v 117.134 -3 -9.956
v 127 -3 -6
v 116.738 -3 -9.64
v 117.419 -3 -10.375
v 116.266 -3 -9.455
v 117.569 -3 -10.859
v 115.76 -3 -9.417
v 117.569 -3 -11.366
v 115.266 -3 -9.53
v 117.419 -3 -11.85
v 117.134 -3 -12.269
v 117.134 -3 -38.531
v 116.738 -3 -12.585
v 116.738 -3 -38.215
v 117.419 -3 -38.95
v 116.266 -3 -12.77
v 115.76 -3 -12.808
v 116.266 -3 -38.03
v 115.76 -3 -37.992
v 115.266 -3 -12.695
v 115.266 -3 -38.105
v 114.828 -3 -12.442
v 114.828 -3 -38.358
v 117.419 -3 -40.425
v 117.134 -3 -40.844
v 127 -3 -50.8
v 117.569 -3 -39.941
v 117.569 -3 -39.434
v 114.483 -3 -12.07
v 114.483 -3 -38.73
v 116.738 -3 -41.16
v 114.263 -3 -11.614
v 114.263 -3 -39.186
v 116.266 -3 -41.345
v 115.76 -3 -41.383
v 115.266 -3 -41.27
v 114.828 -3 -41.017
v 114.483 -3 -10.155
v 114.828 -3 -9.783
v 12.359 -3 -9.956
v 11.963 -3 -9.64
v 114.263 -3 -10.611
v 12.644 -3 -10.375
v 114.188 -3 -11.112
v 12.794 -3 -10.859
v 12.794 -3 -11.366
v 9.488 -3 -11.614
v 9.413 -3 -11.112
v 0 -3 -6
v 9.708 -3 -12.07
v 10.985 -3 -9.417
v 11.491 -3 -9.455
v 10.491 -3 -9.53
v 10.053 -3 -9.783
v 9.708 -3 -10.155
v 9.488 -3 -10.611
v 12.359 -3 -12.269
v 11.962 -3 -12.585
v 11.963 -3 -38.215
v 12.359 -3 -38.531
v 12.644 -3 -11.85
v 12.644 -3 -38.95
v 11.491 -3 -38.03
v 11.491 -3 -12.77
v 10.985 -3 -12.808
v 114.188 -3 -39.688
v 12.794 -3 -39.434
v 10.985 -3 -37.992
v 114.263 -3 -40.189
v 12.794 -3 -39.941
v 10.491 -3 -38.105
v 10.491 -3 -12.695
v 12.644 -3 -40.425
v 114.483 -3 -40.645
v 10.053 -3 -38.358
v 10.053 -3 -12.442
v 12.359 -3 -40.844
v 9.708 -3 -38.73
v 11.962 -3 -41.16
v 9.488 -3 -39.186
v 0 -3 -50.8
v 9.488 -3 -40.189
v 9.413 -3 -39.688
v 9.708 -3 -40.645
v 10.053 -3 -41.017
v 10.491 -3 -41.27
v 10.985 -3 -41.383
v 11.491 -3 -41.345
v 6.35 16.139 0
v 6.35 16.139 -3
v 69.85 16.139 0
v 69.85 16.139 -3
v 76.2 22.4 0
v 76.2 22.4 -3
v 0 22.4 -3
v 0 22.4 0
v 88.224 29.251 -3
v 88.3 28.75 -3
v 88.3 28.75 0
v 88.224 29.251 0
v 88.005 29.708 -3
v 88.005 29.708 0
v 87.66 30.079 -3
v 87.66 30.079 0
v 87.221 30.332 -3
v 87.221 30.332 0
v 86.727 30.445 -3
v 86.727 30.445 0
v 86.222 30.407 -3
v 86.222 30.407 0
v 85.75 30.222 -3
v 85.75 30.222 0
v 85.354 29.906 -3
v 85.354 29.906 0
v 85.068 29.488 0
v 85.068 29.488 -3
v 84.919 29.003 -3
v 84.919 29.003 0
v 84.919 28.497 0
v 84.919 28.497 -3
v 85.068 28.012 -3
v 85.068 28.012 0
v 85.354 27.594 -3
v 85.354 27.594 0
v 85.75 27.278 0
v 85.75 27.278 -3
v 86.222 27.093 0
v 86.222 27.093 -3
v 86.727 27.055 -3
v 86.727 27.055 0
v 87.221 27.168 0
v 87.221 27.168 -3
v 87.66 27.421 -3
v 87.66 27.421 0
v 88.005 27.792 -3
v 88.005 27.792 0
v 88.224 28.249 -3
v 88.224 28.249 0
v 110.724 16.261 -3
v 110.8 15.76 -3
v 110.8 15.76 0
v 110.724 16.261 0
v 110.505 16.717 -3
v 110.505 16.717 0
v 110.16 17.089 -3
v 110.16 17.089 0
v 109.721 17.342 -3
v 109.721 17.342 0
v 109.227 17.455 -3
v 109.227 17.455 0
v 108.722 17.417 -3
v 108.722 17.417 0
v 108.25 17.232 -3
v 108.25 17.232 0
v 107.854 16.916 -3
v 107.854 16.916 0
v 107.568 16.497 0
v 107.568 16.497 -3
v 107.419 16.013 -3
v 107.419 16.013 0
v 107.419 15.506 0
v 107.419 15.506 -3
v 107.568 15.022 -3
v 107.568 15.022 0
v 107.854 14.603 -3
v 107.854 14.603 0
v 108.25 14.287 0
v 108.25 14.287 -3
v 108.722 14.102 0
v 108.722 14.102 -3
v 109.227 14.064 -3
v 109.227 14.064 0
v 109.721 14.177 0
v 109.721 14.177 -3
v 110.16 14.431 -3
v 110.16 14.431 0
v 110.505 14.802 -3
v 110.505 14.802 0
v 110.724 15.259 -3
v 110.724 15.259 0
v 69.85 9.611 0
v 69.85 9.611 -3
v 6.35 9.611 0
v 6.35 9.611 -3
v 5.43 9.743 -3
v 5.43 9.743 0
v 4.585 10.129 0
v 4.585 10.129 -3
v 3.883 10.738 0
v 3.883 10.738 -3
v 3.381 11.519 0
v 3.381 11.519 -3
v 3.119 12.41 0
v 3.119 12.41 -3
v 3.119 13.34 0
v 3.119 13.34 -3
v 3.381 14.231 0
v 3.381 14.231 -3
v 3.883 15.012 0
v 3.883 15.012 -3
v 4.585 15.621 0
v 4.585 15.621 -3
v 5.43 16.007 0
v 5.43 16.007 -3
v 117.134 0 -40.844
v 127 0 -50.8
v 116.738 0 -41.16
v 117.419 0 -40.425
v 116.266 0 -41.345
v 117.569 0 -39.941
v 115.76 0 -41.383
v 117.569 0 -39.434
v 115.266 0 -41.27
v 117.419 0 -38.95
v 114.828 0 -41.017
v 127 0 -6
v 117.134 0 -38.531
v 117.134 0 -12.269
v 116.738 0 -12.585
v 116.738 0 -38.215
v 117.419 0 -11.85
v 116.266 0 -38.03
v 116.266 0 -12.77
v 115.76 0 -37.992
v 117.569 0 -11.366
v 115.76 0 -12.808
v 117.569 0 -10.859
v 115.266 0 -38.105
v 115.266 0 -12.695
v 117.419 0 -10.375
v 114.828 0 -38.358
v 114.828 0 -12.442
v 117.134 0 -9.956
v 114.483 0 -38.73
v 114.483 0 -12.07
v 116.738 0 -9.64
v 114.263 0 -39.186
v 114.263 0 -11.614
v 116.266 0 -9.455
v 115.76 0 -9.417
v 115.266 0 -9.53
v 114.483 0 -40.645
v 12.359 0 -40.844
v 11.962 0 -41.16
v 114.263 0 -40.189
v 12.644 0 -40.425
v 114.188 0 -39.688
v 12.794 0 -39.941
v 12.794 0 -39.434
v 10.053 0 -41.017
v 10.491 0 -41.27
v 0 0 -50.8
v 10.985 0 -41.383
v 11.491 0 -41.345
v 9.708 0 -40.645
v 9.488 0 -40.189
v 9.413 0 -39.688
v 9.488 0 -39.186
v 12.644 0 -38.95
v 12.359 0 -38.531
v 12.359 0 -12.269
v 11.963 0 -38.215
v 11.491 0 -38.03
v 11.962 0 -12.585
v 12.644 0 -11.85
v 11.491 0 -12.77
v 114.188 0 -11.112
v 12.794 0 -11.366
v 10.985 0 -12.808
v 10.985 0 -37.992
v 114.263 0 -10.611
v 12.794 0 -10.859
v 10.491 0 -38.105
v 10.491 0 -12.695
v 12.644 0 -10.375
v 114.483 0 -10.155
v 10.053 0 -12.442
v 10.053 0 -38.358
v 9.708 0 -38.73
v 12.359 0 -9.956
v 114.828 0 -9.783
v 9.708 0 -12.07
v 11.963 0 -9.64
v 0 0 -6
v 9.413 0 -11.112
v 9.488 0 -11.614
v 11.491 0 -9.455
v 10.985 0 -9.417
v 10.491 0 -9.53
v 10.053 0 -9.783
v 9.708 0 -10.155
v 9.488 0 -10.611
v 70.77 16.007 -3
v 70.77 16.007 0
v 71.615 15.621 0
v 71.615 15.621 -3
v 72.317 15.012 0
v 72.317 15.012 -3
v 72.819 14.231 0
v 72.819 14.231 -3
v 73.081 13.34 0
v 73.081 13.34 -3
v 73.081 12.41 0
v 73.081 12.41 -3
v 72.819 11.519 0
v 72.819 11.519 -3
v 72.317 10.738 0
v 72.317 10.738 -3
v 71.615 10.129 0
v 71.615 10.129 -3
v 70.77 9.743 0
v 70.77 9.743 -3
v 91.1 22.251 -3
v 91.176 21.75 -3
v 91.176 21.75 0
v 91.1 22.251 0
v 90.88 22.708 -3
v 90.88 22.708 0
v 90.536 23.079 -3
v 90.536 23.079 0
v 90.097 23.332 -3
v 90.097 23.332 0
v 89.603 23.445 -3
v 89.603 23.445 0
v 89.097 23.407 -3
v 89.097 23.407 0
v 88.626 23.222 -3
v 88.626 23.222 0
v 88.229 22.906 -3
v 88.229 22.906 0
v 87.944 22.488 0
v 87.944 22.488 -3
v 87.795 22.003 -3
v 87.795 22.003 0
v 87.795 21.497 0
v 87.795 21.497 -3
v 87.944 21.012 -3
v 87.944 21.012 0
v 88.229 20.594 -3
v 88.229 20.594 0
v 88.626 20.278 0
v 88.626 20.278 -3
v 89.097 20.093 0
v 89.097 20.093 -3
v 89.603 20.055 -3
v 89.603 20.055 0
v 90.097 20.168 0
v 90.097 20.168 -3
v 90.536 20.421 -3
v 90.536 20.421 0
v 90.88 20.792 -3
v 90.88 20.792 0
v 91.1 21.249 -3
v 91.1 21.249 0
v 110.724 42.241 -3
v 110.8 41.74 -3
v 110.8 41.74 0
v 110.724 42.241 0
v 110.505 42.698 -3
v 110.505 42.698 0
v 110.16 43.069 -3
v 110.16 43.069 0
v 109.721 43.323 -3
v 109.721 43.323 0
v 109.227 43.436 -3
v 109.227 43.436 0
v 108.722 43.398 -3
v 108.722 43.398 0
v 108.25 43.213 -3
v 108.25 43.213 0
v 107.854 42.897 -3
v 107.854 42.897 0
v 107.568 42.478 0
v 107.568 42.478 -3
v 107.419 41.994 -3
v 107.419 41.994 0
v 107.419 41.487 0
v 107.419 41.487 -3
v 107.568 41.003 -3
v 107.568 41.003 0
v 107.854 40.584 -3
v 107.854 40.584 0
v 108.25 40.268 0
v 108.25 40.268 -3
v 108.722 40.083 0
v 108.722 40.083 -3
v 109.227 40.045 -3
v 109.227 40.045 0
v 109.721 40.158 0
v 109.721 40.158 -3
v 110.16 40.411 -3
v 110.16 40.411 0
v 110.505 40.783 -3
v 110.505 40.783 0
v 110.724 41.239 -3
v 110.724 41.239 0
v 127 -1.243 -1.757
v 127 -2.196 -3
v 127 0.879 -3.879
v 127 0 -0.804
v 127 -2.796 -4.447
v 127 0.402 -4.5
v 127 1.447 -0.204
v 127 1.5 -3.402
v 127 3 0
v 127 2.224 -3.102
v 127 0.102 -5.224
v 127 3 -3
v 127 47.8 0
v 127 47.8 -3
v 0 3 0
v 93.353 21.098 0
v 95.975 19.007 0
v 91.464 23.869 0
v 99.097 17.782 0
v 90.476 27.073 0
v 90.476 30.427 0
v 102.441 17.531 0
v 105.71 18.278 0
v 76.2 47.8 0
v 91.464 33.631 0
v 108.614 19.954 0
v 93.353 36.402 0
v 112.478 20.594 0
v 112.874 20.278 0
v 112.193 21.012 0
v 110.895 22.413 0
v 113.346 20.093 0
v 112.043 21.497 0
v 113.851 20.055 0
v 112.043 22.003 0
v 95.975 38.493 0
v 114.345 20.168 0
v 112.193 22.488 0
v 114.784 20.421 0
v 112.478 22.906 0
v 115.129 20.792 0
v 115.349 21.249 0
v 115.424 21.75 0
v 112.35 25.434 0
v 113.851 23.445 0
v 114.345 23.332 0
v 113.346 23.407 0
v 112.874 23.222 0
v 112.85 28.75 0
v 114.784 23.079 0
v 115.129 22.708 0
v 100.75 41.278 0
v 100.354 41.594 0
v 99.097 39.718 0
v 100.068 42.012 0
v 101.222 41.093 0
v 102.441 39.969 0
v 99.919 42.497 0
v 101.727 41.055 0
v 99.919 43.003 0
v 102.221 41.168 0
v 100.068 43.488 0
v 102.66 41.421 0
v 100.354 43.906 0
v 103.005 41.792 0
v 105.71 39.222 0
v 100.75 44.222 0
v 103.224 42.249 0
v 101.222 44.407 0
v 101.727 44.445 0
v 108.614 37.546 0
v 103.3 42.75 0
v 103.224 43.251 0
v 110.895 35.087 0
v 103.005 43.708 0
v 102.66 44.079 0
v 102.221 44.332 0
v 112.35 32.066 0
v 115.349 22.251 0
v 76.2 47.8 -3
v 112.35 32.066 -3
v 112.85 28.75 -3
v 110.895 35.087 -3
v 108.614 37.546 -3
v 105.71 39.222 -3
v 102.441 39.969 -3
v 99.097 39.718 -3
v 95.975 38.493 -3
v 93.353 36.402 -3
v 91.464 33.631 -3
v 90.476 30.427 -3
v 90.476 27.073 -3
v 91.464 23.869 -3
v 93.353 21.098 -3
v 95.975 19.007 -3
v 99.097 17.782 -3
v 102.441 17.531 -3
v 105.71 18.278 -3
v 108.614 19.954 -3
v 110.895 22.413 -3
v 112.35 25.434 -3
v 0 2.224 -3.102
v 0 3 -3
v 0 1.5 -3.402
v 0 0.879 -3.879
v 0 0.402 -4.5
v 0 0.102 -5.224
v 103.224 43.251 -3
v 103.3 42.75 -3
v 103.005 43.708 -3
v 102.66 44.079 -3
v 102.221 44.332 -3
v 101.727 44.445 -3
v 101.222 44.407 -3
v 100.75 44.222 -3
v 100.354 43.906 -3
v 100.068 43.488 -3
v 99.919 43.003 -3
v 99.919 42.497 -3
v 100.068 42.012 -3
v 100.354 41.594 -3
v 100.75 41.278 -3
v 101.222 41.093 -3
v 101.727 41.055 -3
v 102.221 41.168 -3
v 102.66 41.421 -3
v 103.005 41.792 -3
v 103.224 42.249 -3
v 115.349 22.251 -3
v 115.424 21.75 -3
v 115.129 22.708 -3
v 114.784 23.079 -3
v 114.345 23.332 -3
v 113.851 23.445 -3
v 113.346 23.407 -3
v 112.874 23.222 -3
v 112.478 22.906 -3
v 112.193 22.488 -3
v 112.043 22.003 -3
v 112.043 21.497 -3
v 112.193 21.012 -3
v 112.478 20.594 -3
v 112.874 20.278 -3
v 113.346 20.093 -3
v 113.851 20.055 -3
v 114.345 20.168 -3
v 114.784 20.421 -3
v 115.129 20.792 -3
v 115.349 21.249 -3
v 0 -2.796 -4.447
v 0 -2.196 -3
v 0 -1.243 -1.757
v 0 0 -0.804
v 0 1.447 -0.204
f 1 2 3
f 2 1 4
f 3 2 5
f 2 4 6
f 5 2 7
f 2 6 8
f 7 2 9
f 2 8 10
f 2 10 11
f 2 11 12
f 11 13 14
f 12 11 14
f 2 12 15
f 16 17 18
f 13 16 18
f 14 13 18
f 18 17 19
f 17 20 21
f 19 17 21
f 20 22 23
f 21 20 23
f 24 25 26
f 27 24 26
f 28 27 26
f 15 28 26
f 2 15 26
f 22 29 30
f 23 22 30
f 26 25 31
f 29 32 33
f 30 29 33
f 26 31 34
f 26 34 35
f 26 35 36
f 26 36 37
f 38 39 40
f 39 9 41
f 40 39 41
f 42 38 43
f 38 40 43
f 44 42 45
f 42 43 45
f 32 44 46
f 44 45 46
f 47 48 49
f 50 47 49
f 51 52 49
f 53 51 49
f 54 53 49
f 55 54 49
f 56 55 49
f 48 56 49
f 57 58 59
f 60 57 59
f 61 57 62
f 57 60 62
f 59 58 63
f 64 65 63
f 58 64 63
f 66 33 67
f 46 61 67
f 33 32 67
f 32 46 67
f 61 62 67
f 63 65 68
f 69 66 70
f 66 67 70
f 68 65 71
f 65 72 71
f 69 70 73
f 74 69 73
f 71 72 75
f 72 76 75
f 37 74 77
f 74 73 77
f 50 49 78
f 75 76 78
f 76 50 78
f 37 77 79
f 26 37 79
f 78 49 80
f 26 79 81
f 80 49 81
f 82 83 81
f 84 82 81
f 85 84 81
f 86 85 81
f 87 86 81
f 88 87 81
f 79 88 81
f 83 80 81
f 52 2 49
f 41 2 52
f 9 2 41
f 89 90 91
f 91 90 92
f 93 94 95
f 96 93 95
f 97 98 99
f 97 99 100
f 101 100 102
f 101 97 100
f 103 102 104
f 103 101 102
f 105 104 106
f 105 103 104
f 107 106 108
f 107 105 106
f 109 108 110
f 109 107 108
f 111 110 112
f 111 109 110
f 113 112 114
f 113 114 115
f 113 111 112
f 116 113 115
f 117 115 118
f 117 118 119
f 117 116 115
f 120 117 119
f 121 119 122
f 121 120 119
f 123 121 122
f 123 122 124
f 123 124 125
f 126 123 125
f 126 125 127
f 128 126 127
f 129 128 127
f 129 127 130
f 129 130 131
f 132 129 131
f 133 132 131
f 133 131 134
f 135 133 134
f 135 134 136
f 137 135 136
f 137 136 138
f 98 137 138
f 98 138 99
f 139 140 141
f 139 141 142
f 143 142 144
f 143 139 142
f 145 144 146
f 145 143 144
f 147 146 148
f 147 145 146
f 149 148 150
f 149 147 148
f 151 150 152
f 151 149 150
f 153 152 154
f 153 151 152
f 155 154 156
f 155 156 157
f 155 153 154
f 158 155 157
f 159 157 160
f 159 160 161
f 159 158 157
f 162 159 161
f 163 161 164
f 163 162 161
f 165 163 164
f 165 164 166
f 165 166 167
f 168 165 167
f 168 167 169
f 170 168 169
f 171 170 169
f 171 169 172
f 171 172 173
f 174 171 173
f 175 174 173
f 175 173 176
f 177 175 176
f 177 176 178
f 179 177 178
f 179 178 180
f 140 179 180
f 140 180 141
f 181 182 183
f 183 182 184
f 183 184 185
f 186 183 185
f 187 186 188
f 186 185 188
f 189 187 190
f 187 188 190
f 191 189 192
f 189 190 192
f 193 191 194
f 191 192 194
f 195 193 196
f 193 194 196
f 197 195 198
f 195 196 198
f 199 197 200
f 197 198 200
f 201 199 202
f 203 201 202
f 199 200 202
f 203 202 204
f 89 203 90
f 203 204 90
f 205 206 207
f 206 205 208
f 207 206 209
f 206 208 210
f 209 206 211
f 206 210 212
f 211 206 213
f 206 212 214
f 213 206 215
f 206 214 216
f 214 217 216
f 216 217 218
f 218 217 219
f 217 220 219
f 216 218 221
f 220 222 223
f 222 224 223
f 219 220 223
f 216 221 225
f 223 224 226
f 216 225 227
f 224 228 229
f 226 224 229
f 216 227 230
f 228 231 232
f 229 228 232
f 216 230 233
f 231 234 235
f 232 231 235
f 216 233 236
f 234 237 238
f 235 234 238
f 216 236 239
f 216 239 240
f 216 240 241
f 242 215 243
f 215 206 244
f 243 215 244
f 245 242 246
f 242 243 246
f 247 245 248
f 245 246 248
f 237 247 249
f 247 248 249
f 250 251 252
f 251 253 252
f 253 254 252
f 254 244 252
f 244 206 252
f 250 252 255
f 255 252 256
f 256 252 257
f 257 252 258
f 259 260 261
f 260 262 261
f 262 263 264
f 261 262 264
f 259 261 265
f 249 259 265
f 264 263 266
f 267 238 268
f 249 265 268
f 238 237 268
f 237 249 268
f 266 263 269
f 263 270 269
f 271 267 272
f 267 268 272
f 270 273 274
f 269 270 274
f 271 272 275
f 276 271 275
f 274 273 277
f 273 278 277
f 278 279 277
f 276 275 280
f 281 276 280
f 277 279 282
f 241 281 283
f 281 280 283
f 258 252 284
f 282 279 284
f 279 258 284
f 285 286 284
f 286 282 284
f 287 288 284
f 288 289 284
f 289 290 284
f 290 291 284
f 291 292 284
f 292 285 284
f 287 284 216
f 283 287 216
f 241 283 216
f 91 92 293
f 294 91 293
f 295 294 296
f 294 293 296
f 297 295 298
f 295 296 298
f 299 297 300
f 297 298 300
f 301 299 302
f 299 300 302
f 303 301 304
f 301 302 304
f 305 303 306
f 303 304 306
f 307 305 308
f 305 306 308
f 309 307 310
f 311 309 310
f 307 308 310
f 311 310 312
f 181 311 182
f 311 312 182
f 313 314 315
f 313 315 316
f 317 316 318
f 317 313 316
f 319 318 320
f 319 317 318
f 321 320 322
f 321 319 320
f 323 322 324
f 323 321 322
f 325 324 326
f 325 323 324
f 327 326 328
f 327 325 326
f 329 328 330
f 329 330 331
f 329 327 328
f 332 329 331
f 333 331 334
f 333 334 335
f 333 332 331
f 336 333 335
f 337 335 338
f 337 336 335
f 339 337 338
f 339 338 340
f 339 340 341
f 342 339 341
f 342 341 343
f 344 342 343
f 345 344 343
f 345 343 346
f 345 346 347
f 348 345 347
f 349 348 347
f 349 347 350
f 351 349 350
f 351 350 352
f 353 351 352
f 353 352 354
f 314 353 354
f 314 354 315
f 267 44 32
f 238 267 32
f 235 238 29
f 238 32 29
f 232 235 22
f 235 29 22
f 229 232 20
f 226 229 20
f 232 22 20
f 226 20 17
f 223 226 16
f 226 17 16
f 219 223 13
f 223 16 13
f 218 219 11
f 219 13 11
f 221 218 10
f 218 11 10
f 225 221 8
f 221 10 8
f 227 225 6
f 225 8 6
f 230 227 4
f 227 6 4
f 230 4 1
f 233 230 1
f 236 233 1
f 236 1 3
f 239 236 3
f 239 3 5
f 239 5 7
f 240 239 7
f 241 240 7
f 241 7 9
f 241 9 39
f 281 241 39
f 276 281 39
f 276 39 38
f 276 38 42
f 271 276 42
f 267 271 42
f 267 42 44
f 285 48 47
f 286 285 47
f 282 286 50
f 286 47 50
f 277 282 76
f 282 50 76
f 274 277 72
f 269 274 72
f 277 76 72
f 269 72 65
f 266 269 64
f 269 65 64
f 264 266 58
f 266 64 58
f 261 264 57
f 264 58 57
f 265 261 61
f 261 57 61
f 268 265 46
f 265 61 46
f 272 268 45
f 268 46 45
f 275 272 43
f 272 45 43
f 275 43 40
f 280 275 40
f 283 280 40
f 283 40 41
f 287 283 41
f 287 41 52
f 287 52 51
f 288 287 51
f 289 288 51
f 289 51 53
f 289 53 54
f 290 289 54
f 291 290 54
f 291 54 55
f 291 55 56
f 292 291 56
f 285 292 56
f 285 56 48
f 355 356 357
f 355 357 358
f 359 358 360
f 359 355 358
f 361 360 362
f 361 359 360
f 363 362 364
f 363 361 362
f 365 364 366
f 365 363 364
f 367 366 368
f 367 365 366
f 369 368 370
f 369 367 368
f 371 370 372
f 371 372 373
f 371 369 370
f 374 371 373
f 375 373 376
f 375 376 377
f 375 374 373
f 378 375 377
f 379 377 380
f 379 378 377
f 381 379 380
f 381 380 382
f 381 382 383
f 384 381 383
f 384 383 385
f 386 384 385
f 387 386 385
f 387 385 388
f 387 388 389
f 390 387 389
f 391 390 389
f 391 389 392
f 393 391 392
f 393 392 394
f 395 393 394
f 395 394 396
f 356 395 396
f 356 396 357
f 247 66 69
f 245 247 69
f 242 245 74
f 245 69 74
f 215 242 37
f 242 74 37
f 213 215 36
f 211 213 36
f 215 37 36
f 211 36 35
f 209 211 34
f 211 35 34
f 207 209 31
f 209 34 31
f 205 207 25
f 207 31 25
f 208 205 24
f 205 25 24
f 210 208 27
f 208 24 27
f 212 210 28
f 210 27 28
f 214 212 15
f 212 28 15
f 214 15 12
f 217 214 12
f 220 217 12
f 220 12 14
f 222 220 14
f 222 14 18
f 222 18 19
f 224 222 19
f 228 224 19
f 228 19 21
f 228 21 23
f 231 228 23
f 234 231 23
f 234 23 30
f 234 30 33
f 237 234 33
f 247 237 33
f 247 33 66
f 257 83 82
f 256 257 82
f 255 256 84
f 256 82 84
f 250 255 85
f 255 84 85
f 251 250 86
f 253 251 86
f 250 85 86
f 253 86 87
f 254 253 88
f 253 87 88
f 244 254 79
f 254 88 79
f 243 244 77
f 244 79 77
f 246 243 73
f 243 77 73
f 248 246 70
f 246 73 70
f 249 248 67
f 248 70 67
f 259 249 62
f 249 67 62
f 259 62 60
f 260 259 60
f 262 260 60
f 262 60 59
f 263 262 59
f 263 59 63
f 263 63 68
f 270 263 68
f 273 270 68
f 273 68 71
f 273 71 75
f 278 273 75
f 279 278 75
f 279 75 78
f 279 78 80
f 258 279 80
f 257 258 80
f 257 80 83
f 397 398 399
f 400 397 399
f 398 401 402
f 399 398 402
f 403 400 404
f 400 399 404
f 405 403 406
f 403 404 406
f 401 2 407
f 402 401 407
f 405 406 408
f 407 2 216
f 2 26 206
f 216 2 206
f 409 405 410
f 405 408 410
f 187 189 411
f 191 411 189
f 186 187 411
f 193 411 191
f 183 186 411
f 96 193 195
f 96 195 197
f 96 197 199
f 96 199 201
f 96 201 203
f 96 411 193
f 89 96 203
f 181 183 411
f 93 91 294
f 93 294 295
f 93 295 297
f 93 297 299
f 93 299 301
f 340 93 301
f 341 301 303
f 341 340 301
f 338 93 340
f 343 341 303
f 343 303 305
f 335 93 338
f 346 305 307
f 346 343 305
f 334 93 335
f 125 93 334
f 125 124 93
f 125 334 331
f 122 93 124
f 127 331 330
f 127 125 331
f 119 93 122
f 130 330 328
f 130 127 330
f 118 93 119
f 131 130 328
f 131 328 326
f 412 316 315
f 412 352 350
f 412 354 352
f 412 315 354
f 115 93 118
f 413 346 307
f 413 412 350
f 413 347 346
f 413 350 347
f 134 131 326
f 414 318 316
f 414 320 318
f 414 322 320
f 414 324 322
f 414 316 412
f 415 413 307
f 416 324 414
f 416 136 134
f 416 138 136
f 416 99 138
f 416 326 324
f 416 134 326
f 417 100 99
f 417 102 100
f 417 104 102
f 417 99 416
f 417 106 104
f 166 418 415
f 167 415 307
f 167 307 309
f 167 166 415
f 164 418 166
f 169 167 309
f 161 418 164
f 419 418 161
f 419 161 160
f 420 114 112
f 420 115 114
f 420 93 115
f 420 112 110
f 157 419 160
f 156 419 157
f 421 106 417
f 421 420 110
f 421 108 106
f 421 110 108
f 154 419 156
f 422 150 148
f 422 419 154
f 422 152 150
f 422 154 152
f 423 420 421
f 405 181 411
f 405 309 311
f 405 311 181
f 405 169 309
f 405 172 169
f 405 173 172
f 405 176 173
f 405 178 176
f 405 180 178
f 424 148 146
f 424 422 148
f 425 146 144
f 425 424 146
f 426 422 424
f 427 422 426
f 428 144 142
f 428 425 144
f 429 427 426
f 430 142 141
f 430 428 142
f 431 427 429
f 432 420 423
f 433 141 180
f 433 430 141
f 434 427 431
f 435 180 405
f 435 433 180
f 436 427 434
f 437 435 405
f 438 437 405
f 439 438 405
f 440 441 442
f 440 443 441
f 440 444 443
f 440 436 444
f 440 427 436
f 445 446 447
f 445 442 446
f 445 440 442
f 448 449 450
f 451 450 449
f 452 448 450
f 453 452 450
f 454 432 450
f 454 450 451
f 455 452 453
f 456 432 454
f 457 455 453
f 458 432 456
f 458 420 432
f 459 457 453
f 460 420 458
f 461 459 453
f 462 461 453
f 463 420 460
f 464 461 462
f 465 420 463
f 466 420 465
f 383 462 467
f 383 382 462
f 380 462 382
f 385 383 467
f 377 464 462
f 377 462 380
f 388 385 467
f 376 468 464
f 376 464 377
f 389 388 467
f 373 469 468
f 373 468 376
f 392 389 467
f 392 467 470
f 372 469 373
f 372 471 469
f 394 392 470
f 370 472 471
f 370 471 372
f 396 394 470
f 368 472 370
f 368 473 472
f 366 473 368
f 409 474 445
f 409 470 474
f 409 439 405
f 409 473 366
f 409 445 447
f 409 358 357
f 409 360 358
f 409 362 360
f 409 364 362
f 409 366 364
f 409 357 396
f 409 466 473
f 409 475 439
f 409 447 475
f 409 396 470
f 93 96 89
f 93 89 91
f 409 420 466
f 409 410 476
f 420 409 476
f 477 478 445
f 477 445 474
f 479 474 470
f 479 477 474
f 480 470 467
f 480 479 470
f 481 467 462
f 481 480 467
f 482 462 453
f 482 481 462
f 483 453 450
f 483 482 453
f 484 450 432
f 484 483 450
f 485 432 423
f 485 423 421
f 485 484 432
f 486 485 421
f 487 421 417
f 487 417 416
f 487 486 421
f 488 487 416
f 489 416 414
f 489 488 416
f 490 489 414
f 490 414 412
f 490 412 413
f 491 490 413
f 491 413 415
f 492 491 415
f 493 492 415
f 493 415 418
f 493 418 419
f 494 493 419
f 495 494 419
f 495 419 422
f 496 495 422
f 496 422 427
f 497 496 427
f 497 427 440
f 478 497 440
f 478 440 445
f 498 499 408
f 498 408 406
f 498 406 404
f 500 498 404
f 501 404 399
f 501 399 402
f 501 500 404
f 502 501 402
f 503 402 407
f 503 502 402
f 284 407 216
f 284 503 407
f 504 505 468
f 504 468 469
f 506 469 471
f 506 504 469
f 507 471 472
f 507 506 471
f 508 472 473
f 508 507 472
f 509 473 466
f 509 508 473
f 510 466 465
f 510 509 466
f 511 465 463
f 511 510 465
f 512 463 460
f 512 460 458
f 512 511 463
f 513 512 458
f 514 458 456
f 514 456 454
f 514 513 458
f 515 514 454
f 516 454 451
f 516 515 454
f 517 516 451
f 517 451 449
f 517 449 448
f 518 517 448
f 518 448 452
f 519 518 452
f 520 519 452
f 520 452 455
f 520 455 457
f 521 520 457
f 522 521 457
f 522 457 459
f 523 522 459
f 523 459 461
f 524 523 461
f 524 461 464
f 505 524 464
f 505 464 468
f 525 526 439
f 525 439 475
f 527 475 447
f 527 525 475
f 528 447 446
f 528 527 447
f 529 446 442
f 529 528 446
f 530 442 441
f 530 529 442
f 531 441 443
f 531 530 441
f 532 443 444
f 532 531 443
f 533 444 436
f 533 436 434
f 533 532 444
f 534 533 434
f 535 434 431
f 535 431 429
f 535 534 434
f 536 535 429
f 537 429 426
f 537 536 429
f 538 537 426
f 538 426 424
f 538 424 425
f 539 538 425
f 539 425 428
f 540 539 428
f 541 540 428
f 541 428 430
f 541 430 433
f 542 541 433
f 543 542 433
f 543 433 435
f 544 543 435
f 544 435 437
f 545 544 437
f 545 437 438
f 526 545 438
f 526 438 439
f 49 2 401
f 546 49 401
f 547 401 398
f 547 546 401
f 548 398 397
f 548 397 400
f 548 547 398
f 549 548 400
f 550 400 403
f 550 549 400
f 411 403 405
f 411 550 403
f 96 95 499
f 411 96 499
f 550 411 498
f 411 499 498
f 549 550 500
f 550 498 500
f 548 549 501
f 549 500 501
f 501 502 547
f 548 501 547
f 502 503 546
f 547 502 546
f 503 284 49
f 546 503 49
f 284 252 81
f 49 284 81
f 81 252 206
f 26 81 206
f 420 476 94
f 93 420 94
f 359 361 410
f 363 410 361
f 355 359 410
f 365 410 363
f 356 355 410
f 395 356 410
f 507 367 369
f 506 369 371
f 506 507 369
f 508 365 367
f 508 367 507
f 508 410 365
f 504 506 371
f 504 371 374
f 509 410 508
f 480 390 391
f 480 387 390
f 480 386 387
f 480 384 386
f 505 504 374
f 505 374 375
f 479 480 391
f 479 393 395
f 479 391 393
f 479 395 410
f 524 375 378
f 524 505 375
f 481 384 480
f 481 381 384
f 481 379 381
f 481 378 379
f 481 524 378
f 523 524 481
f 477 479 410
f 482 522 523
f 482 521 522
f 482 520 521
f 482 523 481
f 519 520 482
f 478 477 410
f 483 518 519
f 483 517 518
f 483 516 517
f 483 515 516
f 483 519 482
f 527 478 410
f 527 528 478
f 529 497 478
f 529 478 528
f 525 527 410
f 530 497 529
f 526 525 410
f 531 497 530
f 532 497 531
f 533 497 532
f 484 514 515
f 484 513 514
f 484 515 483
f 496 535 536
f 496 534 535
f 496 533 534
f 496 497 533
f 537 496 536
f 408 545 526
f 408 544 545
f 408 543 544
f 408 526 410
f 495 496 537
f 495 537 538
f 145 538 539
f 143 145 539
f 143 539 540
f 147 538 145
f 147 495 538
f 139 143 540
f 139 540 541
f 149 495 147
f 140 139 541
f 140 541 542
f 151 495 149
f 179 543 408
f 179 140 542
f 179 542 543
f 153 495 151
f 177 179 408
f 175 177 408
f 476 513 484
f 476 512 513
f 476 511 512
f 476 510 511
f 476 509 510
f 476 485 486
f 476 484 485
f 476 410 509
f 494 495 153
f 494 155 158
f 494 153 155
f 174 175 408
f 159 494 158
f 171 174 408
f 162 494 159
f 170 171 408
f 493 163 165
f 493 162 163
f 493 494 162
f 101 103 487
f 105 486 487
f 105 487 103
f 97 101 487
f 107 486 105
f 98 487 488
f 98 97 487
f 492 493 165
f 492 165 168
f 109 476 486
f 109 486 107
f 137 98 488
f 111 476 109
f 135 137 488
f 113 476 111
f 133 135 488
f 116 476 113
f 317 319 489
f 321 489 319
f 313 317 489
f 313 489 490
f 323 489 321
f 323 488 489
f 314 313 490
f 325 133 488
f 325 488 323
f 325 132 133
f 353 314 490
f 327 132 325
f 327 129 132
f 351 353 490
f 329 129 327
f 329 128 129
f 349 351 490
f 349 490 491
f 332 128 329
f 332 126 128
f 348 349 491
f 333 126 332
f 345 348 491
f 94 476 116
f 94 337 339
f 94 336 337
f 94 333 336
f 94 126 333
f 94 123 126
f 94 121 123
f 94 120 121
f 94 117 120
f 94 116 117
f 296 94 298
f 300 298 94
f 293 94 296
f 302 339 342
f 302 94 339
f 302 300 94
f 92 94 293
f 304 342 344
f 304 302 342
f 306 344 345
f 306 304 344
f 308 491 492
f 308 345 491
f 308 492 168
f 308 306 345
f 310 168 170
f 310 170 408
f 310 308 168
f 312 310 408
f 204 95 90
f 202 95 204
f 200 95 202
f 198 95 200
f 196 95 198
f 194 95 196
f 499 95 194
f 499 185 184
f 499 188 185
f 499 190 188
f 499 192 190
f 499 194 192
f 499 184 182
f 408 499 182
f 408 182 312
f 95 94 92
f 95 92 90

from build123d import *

# Parameters (mm, degrees)
SKETCH1_W                    = 127
SKETCH1_H                    = 50.8
BASE_FLANGE1_DEPTH           = 3
EDGE_FLANGE1_STRIP_W         = 18
EDGE_FLANGE1_STRIP_H         = 3
EDGE_FLANGE1_STRIP_CUT_DEPTH = 127
EDGE_FLANGE1_DEPTH           = 127
UNFOLD1_DEPTH                = 127
UNFOLD1_2_DEPTH              = 127
SKETCH9_R                    = 11.25
SKETCH9_W                    = 76.2
SKETCH9_H                    = 25.4
CUT_EXTRUDE1_DEPTH           = 137.816080926
M3_CLEARANCE_HOLE1_D         = 3.4
M3_CLEARANCE_HOLE1_DEPTH     = 7.62
M3_CLEARANCE_HOLE1_TIP       = 1.021463052
M3_CLEARANCE_HOLE2_D         = 3.4
M3_CLEARANCE_HOLE2_DEPTH     = 7.62
M3_CLEARANCE_HOLE2_TIP       = 1.021463052
FOLD1_START                  = -0.61644
FOLD1_OUTLINE_W              = 127
FOLD1_OUTLINE_H              = 3
FOLD1_DEPTH                  = 46.485023471
FOLD1_START_2                = -3
FOLD1_2_OUTLINE_R            = 1.7
FOLD1_2_OUTLINE_R_2          = 11.25
FOLD1_2_DEPTH                = 0.01644
FOLD1_START_3                = -6
FOLD1_3_OUTLINE_R            = 1.7
FOLD1_3_OUTLINE_R_2          = 11.25
FOLD1_3_DEPTH                = 6
FOLD1_4_DEPTH                = 127


with BuildPart() as part:
    # Base-Flange1: sheet metal written as solids
    # Sketch1 → Base-Flange1 (new body)
    with BuildSketch(Plane(origin=(0, 0, 0), x_dir=(1, 0, 0), z_dir=(0, 1, 0))):
        with Locations((63.5, 25.4)):
            Rectangle(SKETCH1_W, SKETCH1_H)
    extrude(amount=-BASE_FLANGE1_DEPTH)

    # Edge-Flange1: sheet metal written as solids
    # Edge-Flange1 strip (on a plane across the edge) → Edge-Flange1 strip cut (cut)
    with BuildSketch(Plane(origin=(0, 0, 0), x_dir=(0, 0, -1), z_dir=(1, 0, 0))):
        with Locations((-3, -1.5)):
            Rectangle(EDGE_FLANGE1_STRIP_W, EDGE_FLANGE1_STRIP_H)
    extrude(amount=EDGE_FLANGE1_STRIP_CUT_DEPTH, mode=Mode.SUBTRACT)

    # Edge-Flange1 section (on a plane across the edge) → Edge-Flange1 (add)
    with BuildSketch(Plane(origin=(0, 0, 0), x_dir=(0, 0, -1), z_dir=(1, 0, 0))):
        with BuildLine():
            Line((0, 3), (0, 47.8))
            Line((0, 47.8), (3, 47.8))
            Line((3, 47.8), (3, 3))
            ThreePointArc((3, 3), (3.878679656, 0.878679656), (6, 0))
            Line((6, 0), (6, -3))
            ThreePointArc((6, -3), (1.757359313, -1.242640687), (0, 3))
        make_face()
    extrude(amount=EDGE_FLANGE1_DEPTH)

    # Unfold1: read off the stored shape, not the designer's step
    # Unfold1 outline → Unfold1 (cut)
    with BuildSketch(Plane.YZ):
        with BuildLine():
            ThreePointArc((3, 0), (1.447085729, -0.204445042), (0, -0.803847577))
            Line((0, -0.803847577), (0, -6))
            ThreePointArc((0, -6), (0.878679656, -3.878679656), (3, -3))
            Line((3, -3), (47.8, -3))
            Line((47.8, -3), (47.8, 0))
            Line((47.8, 0), (3, 0))
        make_face()
    extrude(amount=UNFOLD1_DEPTH, mode=Mode.SUBTRACT)

    # Unfold1 2 outline → Unfold1 2 (add)
    with BuildSketch(Plane.YZ):
        with BuildLine():
            Line((-3, 45.868583471), (-3, -6))
            ThreePointArc((-3, -6), (-2.196152423, -3), (0, -0.803847577))
            Line((0, -0.803847577), (0, 45.868583471))
            Line((0, 45.868583471), (-3, 45.868583471))
        make_face()
    extrude(amount=UNFOLD1_2_DEPTH)

    # Sketch9 → Cut-Extrude1 (cut, through all)
    with BuildSketch(Plane(origin=(0, 0, 0), x_dir=(1, 0, 0), z_dir=(0, 1, 0))):
        with Locations(Location((101.6, -26.818583471, 0), (0, 0, 270))):
            Circle(SKETCH9_R)
        with Locations((38.1, -33.168583471)):
            Rectangle(SKETCH9_W, SKETCH9_H)
        with BuildLine():
            Line((6.35, -7.679683471), (69.85, -7.679683471))
            ThreePointArc((69.85, -7.679683471), (73.1139, -10.943583471), (69.85, -14.207483471))
            Line((69.85, -14.207483471), (6.35, -14.207483471))
            ThreePointArc((6.35, -14.207483471), (3.0861, -10.943583471), (6.35, -7.679683471))
        make_face()
    extrude(amount=-CUT_EXTRUDE1_DEPTH, mode=Mode.SUBTRACT)

    # M3 Clearance Hole1
    with Locations(Plane(origin=(0, 0, 0), x_dir=(1, 0, 0), z_dir=(0, 1, 0))):
        with Locations((109.1, -13.828202414), (101.6, -40.818583471), (109.1, -39.808964527), (89.475644347, -19.818583471), (86.6, -26.818583471), (113.724355653, -19.818583471)):
            Hole(M3_CLEARANCE_HOLE1_D / 2, depth=M3_CLEARANCE_HOLE1_DEPTH)
            with Locations((0, 0, -(M3_CLEARANCE_HOLE1_DEPTH + M3_CLEARANCE_HOLE1_TIP / 2))):  # 118° drill point
                Cone(0, M3_CLEARANCE_HOLE1_D / 2, M3_CLEARANCE_HOLE1_TIP, mode=Mode.SUBTRACT)

    # M3 Clearance Hole2
    with Locations(Plane(origin=(0, 0, 0), x_dir=(1, 0, 0), z_dir=(0, 1, 0))):
        with Locations((11.1125, 39.6875), (115.8875, 39.6875), (115.8875, 11.1125), (11.1125, 11.1125)):
            Hole(M3_CLEARANCE_HOLE2_D / 2, depth=M3_CLEARANCE_HOLE2_DEPTH)
            with Locations((0, 0, -(M3_CLEARANCE_HOLE2_DEPTH + M3_CLEARANCE_HOLE2_TIP / 2))):  # 118° drill point
                Cone(0, M3_CLEARANCE_HOLE2_D / 2, M3_CLEARANCE_HOLE2_TIP, mode=Mode.SUBTRACT)

    # Fold1: read off the stored shape, not the designer's step
    # Fold1 outline → Fold1 (cut)
    with BuildSketch(Plane.XY.offset(FOLD1_START)):
        with Locations((63.5, -1.5)):
            Rectangle(FOLD1_OUTLINE_W, FOLD1_OUTLINE_H)
    extrude(amount=FOLD1_DEPTH, mode=Mode.SUBTRACT)

    # Fold1 2 outline → Fold1 2 (add)
    with BuildSketch(Plane.XY.offset(FOLD1_START_2)):
        Polygon((0, 22.4), (0, 0), (127, 0), (127, 47.8), (76.2, 47.8), (76.2, 22.4), align=None)
        with BuildLine():
            Line((69.85, 9.6111), (6.35, 9.6111))
            ThreePointArc((6.35, 9.6111), (3.0861, 12.875), (6.35, 16.1389))
            Line((6.35, 16.1389), (69.85, 16.1389))
            ThreePointArc((69.85, 16.1389), (73.1139, 12.875), (69.85, 9.6111))
        make_face(mode=Mode.SUBTRACT)
        with Locations((89.475644347, 21.75)):
            Circle(FOLD1_2_OUTLINE_R, mode=Mode.SUBTRACT)
        with Locations((109.1, 15.759618943)):
            Circle(FOLD1_2_OUTLINE_R, mode=Mode.SUBTRACT)
        with Locations((113.724355653, 21.75)):
            Circle(FOLD1_2_OUTLINE_R, mode=Mode.SUBTRACT)
        with Locations((86.6, 28.75)):
            Circle(FOLD1_2_OUTLINE_R, mode=Mode.SUBTRACT)
        with Locations((101.6, 28.75)):
            Circle(FOLD1_2_OUTLINE_R_2, mode=Mode.SUBTRACT)
        with Locations((101.6, 42.75)):
            Circle(FOLD1_2_OUTLINE_R, mode=Mode.SUBTRACT)
        with Locations((109.1, 41.740381057)):
            Circle(FOLD1_2_OUTLINE_R, mode=Mode.SUBTRACT)
    extrude(amount=FOLD1_2_DEPTH)

    # Fold1 3 outline → Fold1 3 (add)
    with BuildSketch(Plane.XY.offset(FOLD1_START_3)):
        Polygon((0, 22.4), (0, 0), (127, 0), (127, 47.8), (76.2, 47.8), (76.2, 22.4), align=None)
        with BuildLine():
            Line((69.85, 9.6111), (6.35, 9.6111))
            ThreePointArc((6.35, 9.6111), (3.0861, 12.875), (6.35, 16.1389))
            Line((6.35, 16.1389), (69.85, 16.1389))
            ThreePointArc((69.85, 16.1389), (73.1139, 12.875), (69.85, 9.6111))
        make_face(mode=Mode.SUBTRACT)
        with Locations((89.475644347, 21.75)):
            Circle(FOLD1_3_OUTLINE_R, mode=Mode.SUBTRACT)
        with Locations((109.1, 15.759618943)):
            Circle(FOLD1_3_OUTLINE_R, mode=Mode.SUBTRACT)
        with Locations((113.724355653, 21.75)):
            Circle(FOLD1_3_OUTLINE_R, mode=Mode.SUBTRACT)
        with Locations((86.6, 28.75)):
            Circle(FOLD1_3_OUTLINE_R, mode=Mode.SUBTRACT)
        with Locations((101.6, 28.75)):
            Circle(FOLD1_3_OUTLINE_R_2, mode=Mode.SUBTRACT)
        with Locations((101.6, 42.75)):
            Circle(FOLD1_3_OUTLINE_R, mode=Mode.SUBTRACT)
        with Locations((109.1, 41.740381057)):
            Circle(FOLD1_3_OUTLINE_R, mode=Mode.SUBTRACT)
    extrude(amount=FOLD1_3_DEPTH)

    # Fold1 4 outline → Fold1 4 (cut)
    with BuildSketch(Plane.YZ):
        with BuildLine():
            ThreePointArc((-3, -6), (-1.242640687, -1.757359313), (3, 0))
            Line((3, 0), (0, 0))
            Line((0, 0), (0, -0.61644))
            Line((0, -0.61644), (-3, -0.61644))
            Line((-3, -0.61644), (-3, -6))
        make_face()
        with BuildLine():
            ThreePointArc((3, -3), (0.878679656, -3.878679656), (0, -6))
            Line((0, -6), (47.8, -6))
            Line((47.8, -6), (47.8, -3))
            Line((47.8, -3), (3, -3))
        make_face()
    extrude(amount=FOLD1_4_DEPTH, mode=Mode.SUBTRACT)


solid = part.part
